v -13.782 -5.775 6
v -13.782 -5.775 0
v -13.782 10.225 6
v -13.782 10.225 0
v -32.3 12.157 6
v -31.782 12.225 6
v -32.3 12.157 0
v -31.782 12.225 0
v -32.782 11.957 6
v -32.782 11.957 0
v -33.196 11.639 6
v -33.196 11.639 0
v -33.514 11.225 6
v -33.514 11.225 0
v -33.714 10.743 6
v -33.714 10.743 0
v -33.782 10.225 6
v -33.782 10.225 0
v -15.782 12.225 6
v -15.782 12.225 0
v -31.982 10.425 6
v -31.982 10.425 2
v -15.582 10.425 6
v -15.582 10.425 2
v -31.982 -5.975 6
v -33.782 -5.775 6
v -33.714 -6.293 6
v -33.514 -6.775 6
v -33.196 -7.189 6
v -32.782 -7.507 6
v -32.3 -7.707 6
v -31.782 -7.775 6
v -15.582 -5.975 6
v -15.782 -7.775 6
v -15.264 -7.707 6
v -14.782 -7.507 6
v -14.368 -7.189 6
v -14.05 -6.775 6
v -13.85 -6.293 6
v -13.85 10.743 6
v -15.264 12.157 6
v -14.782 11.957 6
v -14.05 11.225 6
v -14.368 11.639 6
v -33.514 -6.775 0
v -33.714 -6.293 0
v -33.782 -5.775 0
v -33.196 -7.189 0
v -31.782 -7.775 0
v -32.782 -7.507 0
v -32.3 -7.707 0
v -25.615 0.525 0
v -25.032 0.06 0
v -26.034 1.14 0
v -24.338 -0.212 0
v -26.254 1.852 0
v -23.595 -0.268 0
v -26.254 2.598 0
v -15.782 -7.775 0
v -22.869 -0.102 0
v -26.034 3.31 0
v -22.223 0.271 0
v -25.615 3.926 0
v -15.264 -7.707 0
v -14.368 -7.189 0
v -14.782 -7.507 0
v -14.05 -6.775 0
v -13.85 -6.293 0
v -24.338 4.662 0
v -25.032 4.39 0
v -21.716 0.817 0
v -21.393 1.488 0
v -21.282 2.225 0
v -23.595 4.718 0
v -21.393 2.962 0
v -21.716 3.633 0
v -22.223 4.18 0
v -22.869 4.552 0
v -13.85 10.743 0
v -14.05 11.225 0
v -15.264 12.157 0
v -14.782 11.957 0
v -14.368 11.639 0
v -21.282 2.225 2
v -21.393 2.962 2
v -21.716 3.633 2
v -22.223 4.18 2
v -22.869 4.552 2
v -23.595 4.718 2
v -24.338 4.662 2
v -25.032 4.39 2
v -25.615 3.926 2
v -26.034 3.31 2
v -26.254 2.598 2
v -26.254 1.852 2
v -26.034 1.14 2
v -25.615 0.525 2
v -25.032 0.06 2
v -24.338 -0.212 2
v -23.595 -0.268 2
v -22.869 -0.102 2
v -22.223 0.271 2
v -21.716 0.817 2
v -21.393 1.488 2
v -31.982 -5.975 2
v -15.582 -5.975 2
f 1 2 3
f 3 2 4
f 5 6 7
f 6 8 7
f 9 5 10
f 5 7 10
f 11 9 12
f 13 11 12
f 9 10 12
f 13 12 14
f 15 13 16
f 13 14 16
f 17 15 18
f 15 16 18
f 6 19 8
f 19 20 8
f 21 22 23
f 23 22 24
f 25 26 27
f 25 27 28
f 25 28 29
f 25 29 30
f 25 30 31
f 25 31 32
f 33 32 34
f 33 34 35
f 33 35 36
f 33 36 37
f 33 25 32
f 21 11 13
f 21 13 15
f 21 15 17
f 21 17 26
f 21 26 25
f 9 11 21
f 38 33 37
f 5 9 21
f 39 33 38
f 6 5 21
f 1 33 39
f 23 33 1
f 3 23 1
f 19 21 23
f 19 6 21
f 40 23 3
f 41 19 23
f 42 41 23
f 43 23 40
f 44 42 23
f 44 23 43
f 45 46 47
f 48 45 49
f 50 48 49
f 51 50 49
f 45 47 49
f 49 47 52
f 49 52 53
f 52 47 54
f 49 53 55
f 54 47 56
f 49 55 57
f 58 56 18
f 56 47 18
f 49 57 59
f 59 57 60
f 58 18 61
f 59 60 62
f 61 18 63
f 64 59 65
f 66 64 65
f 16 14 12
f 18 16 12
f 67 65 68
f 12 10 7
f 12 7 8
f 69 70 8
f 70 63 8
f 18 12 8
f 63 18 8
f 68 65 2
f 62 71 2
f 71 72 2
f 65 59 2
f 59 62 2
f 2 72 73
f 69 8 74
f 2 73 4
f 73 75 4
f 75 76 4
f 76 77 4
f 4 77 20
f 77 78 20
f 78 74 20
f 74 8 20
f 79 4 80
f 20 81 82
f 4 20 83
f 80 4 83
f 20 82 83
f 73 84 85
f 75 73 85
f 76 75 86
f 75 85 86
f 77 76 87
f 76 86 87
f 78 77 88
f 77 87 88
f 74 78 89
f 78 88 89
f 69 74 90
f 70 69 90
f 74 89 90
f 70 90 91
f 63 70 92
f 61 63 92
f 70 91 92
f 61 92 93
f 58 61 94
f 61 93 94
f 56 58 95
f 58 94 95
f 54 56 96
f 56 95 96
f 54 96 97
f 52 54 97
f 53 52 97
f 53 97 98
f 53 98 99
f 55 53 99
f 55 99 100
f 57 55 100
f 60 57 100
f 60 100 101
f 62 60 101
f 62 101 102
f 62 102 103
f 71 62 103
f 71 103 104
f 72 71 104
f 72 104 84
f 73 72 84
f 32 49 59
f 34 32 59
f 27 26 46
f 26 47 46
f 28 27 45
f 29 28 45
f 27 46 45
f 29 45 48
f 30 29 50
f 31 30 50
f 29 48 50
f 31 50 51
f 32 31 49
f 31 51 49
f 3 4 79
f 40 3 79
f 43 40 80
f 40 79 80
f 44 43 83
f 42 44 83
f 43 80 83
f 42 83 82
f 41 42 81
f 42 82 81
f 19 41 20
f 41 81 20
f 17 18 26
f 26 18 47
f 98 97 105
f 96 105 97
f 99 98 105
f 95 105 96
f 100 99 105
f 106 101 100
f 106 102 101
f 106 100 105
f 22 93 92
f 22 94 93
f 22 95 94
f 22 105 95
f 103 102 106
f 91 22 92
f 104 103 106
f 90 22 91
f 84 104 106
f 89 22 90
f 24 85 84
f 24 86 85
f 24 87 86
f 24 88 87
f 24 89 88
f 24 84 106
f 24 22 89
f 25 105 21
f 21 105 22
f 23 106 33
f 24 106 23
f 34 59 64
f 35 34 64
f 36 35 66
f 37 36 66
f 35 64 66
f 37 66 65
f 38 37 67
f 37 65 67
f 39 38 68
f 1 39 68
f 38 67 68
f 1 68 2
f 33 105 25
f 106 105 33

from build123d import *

# Parameters (mm, degrees)
F1_DEPTH = 2
F2_W     = 16.4
F2_H     = 16.4
F3_DEPTH = 4
F4_R     = 2.5
F5_DEPTH = 25


with BuildPart() as f1:
    # F0 (on Top) → F1 (new body)
    with BuildSketch(Plane.XY):
        with BuildLine():
            Line((-15.782069, 12.225087), (-31.782069, 12.225087))
            ThreePointArc((-31.782069, 12.225087), (-33.196283, 11.6393), (-33.782069, 10.225087))
            Line((-33.782069, 10.225087), (-33.782069, -5.774913))
            ThreePointArc((-33.782069, -5.774913), (-33.196283, -7.189127), (-31.782069, -7.774913))
            Line((-31.782069, -7.774913), (-15.782069, -7.774913))
            ThreePointArc((-15.782069, -7.774913), (-14.367856, -7.189127), (-13.782069, -5.774913))
            Line((-13.782069, -5.774913), (-13.782069, 10.225087))
            ThreePointArc((-13.782069, 10.225087), (-14.367856, 11.6393), (-15.782069, 12.225087))
        make_face()
    extrude(amount=F1_DEPTH)

    # F2 (on face) → F3 (join)
    with BuildSketch(Plane.XY.offset(2)):
        with BuildLine():
            ThreePointArc((-13.782069, 10.225087), (-14.367856, 11.6393), (-15.782069, 12.225087))
            Line((-15.782069, 12.225087), (-31.782069, 12.225087))
            ThreePointArc((-31.782069, 12.225087), (-33.196283, 11.6393), (-33.782069, 10.225087))
            Line((-33.782069, 10.225087), (-33.782069, -5.774913))
            ThreePointArc((-33.782069, -5.774913), (-33.196283, -7.189127), (-31.782069, -7.774913))
            Line((-31.782069, -7.774913), (-15.782069, -7.774913))
            ThreePointArc((-15.782069, -7.774913), (-14.367856, -7.189127), (-13.782069, -5.774913))
            Line((-13.782069, -5.774913), (-13.782069, 10.225087))
        make_face()
        with Locations((-23.782069, 2.225087)):
            Rectangle(F2_W, F2_H, mode=Mode.SUBTRACT)
    extrude(amount=F3_DEPTH)

    # F4 (on face) → F5 (cut)
    with BuildSketch(Plane.XY.offset(2)):
        with Locations((-23.782069, 2.225087)):
            Circle(F4_R)
    extrude(amount=-F5_DEPTH, mode=Mode.SUBTRACT)


solid = f1.part
